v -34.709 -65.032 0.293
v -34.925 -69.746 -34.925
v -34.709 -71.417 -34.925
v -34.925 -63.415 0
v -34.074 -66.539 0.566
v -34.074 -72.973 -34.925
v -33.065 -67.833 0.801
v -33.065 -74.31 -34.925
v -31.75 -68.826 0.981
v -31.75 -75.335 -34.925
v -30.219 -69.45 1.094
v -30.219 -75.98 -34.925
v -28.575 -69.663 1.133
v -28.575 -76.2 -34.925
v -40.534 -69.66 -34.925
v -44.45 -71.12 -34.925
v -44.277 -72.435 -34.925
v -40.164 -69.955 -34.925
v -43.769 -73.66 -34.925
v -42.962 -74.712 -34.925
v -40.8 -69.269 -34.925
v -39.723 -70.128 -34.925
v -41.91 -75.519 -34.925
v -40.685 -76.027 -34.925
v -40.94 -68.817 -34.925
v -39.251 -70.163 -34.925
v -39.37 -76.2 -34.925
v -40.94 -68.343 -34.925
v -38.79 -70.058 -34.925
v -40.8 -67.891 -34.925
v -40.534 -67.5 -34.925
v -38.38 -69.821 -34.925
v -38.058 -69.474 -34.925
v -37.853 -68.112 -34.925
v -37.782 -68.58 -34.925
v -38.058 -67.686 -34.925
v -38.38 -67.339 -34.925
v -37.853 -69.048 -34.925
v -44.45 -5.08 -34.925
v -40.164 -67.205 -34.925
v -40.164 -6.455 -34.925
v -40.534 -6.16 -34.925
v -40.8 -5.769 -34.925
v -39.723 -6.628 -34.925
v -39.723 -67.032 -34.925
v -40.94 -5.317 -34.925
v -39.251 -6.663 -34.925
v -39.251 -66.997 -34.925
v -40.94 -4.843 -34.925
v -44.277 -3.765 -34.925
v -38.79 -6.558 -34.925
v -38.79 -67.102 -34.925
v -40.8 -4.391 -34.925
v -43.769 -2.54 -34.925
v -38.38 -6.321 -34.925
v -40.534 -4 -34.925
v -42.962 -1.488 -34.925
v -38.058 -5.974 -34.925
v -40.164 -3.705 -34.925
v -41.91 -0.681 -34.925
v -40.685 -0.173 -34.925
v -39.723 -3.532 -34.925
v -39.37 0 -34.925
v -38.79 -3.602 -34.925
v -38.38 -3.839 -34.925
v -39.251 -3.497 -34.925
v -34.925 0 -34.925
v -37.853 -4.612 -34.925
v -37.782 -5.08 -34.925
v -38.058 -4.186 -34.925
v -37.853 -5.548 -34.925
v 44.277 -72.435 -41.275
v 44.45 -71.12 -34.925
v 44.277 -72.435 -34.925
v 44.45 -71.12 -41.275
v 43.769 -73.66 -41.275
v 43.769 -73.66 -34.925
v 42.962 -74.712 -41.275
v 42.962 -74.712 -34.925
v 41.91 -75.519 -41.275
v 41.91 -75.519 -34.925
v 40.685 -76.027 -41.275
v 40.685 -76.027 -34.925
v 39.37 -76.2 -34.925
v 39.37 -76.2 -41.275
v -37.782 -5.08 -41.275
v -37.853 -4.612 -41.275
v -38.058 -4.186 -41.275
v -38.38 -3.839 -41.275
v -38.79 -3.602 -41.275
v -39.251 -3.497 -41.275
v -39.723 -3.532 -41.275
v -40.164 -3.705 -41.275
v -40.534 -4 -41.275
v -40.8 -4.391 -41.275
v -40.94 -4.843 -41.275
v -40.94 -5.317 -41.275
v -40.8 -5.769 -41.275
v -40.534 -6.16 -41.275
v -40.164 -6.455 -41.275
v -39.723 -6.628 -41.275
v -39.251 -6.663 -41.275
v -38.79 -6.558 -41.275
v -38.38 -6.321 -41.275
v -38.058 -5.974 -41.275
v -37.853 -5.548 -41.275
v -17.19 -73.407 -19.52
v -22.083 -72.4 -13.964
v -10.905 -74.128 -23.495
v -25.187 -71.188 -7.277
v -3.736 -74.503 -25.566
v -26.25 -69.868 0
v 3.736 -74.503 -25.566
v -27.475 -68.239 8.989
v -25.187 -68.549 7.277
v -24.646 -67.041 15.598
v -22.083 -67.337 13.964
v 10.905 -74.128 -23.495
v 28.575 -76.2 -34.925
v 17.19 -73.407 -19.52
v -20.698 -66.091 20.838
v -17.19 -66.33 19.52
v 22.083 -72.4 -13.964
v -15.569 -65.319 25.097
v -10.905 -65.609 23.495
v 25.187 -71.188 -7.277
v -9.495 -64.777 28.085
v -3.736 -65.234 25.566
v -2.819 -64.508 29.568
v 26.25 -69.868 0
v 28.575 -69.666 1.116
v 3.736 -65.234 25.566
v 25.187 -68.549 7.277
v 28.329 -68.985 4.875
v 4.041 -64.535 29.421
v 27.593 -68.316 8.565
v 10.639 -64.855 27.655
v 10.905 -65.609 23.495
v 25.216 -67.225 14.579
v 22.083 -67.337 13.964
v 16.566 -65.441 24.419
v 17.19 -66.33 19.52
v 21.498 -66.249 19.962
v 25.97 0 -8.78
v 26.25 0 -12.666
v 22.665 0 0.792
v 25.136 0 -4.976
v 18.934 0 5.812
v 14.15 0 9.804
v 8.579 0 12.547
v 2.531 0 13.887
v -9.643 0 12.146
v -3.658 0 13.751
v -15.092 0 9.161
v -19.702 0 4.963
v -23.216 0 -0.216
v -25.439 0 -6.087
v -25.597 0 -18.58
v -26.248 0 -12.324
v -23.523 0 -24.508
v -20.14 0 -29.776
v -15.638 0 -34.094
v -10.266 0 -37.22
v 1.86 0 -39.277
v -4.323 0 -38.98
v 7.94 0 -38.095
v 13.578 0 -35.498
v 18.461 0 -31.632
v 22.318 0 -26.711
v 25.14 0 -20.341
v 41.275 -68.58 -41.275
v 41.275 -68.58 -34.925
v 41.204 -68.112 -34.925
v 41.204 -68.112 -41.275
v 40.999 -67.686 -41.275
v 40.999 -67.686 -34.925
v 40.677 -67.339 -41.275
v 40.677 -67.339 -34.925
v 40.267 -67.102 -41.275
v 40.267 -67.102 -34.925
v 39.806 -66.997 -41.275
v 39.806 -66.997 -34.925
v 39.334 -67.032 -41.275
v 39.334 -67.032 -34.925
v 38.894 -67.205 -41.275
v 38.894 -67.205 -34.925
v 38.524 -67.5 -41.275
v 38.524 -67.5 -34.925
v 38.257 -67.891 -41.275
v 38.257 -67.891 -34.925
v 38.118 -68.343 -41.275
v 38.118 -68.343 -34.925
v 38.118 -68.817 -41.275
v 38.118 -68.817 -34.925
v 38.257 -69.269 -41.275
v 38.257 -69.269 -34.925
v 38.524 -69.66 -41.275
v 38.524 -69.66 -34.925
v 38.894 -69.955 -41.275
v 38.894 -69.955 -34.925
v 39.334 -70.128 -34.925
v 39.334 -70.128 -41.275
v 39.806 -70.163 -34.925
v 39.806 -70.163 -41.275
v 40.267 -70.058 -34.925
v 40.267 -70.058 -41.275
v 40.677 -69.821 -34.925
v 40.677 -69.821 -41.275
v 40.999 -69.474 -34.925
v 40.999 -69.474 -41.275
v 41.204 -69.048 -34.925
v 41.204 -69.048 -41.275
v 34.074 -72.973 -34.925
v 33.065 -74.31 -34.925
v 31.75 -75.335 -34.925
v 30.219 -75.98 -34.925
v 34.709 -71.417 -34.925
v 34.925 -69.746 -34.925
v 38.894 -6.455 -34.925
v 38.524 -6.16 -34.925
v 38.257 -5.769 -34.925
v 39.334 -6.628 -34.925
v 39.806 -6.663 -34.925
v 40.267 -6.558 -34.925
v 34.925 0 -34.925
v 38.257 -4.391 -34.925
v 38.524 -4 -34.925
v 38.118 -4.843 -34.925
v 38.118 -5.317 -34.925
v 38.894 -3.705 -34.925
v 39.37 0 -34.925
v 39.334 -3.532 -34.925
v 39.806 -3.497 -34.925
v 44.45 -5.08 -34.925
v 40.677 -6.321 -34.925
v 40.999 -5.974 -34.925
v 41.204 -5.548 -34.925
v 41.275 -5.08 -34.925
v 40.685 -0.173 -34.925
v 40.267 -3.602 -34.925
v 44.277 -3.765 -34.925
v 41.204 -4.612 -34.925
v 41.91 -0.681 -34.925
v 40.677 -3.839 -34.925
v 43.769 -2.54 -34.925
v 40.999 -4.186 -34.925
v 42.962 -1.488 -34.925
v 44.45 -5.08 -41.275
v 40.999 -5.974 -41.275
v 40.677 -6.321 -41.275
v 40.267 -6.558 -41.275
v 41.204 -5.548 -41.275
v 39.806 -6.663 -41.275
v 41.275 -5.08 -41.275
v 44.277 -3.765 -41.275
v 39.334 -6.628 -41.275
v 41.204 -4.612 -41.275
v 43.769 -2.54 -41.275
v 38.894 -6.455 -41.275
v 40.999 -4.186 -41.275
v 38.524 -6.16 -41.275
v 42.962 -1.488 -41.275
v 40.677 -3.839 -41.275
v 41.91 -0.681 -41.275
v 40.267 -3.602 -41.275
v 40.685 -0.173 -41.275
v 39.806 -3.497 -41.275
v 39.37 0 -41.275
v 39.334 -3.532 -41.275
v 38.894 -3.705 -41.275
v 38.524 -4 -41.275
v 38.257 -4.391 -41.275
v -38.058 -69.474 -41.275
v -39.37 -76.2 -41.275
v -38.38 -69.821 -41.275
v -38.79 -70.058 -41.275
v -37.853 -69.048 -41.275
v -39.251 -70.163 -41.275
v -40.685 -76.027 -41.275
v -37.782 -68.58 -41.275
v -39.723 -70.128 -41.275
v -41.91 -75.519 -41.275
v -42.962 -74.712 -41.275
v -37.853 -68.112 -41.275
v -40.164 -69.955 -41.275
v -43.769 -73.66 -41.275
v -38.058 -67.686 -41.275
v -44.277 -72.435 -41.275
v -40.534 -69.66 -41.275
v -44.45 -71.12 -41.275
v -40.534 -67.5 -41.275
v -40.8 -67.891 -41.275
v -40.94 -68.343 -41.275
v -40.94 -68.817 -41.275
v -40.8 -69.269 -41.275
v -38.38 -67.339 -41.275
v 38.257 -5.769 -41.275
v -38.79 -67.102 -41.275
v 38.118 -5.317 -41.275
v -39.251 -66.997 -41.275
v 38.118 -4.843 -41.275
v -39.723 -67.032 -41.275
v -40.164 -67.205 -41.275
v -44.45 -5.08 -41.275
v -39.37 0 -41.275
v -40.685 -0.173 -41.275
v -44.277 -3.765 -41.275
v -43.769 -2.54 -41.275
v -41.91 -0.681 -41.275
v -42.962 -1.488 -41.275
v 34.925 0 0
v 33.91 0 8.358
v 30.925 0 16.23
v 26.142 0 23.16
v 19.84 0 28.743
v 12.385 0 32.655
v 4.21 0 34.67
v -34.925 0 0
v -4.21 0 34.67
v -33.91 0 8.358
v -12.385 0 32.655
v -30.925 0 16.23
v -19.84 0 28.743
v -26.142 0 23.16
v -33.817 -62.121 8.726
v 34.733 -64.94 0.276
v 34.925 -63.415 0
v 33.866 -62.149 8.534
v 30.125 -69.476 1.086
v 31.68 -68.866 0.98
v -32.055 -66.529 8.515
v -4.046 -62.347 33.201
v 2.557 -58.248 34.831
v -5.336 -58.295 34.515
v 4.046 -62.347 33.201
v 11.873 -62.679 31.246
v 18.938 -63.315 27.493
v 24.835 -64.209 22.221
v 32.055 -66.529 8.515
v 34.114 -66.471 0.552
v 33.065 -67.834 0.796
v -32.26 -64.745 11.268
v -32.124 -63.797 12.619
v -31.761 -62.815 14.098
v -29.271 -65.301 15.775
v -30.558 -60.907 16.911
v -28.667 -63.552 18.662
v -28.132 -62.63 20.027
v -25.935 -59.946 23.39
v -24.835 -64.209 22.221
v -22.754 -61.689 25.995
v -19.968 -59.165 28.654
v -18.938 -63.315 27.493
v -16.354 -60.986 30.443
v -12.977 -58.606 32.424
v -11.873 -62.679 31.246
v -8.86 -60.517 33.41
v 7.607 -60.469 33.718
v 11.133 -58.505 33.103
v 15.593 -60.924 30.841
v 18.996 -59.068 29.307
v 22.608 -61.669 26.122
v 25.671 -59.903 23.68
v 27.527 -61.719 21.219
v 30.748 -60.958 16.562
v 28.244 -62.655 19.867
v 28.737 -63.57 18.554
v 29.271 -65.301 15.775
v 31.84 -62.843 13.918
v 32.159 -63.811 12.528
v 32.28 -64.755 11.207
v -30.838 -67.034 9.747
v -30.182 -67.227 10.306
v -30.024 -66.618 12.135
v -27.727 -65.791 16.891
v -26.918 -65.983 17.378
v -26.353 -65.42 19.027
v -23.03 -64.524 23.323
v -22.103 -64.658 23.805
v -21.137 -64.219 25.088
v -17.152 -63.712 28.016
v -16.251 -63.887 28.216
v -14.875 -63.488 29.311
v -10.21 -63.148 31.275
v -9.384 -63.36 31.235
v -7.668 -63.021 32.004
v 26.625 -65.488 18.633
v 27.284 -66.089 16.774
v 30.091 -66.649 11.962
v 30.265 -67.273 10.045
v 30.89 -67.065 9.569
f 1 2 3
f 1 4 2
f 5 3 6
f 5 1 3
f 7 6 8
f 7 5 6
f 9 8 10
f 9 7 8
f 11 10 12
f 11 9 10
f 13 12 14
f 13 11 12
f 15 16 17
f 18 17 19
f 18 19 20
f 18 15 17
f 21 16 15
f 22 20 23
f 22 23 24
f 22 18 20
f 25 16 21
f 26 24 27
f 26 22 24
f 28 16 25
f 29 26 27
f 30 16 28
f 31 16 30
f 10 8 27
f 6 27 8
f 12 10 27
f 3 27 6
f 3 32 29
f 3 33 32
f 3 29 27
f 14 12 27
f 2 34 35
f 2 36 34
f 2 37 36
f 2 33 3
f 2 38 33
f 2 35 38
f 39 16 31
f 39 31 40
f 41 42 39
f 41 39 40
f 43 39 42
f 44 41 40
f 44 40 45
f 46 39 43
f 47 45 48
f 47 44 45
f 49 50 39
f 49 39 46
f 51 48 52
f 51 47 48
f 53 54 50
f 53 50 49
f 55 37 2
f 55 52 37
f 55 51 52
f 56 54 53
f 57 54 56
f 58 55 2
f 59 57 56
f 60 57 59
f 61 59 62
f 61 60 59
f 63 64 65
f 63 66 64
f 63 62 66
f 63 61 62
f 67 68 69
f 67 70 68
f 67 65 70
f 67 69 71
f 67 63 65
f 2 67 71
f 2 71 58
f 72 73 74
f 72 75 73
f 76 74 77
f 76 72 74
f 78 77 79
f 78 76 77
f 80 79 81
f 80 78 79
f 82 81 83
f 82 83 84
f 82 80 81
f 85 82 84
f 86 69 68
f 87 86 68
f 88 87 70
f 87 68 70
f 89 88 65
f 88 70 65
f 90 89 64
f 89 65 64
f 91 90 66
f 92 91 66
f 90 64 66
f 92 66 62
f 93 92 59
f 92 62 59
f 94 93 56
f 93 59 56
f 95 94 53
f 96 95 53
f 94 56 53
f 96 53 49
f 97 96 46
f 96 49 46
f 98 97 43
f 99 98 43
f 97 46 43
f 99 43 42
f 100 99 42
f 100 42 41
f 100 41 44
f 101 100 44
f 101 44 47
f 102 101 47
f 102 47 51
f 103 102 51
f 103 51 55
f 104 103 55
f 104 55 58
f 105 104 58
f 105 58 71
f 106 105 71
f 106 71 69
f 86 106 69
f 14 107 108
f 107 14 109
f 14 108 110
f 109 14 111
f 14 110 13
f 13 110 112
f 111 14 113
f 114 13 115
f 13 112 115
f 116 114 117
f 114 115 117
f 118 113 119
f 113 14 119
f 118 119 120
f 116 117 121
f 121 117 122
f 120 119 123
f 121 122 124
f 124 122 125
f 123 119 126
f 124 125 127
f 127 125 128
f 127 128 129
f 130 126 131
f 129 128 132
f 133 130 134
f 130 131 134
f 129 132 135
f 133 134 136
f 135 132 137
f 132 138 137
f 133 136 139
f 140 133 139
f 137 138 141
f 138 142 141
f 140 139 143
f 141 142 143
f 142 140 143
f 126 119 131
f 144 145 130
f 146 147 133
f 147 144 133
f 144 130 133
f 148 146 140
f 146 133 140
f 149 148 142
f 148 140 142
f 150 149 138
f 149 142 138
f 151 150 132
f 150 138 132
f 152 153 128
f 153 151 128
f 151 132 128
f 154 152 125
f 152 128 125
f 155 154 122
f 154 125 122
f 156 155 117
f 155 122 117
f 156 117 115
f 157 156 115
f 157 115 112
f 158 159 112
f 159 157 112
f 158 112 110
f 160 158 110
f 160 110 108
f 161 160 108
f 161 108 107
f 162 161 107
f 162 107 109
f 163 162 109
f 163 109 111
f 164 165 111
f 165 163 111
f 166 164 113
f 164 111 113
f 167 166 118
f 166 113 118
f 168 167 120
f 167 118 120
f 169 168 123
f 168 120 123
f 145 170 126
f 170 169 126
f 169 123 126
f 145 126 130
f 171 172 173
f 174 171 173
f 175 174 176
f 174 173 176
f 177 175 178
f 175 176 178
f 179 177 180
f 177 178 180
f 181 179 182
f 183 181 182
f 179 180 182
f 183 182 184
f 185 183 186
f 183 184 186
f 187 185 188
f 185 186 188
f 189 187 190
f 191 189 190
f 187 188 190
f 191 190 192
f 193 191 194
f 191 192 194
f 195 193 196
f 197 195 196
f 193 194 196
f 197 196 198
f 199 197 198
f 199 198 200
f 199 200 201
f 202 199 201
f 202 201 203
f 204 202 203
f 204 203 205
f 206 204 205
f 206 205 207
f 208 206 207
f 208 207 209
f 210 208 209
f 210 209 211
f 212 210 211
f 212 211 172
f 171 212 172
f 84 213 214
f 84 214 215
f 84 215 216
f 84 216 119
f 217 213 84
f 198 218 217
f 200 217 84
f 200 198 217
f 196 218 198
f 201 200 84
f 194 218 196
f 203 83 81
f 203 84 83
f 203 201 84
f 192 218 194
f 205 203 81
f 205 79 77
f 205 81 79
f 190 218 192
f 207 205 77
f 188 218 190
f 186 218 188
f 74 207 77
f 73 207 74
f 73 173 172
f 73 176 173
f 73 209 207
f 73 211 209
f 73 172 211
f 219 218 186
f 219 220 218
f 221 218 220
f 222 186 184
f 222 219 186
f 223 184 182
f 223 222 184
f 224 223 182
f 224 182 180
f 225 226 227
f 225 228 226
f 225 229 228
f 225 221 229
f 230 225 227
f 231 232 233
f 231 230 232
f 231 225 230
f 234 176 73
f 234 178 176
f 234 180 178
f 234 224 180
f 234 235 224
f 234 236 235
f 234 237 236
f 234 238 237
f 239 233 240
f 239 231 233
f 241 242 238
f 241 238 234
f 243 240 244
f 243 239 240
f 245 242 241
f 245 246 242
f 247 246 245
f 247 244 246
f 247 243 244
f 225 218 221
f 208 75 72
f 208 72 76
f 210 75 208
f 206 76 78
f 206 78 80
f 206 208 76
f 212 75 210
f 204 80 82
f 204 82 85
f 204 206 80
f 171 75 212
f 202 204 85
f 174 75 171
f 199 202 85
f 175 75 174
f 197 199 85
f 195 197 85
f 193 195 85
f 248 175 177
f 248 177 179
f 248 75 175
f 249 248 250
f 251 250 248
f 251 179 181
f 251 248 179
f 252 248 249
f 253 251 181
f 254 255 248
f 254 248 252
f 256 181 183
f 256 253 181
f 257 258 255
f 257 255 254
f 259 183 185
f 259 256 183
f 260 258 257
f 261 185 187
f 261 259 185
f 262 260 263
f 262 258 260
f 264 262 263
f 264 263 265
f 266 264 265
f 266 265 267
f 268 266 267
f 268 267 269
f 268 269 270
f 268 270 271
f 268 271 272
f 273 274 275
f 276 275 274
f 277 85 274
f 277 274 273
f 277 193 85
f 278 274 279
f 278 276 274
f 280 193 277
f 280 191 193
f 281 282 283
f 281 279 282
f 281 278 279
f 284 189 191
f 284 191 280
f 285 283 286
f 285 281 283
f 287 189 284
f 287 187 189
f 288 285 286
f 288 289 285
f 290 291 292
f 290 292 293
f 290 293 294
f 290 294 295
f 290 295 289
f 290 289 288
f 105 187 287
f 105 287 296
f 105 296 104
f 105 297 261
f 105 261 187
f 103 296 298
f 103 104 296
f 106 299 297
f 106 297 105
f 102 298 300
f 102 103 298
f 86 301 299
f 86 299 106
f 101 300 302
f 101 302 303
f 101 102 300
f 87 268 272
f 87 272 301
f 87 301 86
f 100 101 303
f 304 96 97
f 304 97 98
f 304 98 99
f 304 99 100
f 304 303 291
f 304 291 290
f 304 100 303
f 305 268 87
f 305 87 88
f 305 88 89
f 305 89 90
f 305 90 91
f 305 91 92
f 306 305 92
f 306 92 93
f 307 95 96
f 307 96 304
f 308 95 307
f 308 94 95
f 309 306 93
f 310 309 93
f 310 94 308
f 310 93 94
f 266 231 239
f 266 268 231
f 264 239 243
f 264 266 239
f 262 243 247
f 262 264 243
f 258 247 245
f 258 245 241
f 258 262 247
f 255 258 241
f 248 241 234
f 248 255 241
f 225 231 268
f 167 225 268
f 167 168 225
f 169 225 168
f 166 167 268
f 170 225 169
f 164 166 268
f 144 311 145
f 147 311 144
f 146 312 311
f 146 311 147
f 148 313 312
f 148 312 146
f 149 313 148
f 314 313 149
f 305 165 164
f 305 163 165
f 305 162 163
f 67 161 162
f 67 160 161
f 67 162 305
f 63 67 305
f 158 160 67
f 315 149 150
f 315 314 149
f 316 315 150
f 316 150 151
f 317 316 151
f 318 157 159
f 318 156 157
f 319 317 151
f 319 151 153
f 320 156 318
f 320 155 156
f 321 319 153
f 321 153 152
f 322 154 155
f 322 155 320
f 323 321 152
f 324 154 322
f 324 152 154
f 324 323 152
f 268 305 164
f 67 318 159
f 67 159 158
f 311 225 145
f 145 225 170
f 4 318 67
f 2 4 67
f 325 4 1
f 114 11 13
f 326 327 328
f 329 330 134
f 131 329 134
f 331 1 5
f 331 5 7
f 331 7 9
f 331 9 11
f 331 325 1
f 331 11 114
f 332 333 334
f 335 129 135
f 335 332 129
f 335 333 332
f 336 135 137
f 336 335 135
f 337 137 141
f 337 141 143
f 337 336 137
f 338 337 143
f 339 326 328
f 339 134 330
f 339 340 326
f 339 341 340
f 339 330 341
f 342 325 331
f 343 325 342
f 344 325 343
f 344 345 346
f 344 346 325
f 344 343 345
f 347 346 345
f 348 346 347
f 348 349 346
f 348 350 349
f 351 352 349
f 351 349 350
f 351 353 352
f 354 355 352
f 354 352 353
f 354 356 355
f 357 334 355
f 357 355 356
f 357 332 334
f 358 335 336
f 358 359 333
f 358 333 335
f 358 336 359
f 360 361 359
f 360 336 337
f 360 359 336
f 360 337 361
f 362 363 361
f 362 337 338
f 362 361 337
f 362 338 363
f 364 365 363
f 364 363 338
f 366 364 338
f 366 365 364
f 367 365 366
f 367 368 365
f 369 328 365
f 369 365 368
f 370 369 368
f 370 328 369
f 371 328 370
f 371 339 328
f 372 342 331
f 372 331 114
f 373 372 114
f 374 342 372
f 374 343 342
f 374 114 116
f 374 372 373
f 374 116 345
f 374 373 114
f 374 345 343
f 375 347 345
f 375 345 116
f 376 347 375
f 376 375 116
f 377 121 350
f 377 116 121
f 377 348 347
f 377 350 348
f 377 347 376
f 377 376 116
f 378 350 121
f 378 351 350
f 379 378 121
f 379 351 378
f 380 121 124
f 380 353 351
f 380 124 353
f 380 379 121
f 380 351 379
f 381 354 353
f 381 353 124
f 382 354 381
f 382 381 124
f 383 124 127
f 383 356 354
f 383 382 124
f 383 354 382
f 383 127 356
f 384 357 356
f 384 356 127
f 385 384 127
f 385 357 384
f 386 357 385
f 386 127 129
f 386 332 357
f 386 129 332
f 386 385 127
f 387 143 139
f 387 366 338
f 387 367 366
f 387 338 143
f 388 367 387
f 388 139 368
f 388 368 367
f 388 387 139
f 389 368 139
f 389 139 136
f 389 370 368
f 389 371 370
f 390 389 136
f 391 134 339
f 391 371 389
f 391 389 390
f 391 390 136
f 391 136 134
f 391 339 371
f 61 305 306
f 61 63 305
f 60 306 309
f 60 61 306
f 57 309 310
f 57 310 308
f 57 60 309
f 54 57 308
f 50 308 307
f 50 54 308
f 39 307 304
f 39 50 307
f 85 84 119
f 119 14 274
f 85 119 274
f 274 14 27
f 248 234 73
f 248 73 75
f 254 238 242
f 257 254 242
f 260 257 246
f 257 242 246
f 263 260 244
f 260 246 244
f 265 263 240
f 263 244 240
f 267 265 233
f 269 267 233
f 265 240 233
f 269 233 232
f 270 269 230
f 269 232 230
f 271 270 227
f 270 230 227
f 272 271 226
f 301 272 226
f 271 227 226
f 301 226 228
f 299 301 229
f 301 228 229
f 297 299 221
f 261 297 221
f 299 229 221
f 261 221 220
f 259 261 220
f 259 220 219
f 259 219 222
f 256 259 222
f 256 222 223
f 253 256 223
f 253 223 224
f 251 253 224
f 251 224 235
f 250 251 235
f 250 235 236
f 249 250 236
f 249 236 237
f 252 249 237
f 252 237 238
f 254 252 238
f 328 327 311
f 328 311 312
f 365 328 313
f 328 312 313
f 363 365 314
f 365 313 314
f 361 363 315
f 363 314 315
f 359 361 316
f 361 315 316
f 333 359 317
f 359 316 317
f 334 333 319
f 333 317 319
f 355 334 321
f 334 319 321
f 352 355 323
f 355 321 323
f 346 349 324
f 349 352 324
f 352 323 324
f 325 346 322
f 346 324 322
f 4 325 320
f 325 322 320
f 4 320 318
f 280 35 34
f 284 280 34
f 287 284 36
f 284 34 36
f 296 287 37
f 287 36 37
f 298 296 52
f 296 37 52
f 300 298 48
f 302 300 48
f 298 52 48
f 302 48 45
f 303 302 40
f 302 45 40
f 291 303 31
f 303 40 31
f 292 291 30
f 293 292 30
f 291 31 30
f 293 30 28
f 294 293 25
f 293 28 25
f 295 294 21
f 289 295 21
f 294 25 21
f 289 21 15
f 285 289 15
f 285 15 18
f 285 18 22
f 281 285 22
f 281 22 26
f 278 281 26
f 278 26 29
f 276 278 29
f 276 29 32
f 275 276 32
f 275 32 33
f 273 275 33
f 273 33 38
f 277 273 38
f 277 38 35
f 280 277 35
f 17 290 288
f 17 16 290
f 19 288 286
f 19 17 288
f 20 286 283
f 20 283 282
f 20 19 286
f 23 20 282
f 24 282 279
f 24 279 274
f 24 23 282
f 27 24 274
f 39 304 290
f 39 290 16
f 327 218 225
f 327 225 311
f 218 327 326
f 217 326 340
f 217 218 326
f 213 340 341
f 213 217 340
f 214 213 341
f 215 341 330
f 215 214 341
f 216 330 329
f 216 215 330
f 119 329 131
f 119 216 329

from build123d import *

# Parameters (mm, degrees)
F1_DEPTH  = 76.2
F3_DEPTH  = 69.851
F6_DEPTH  = 76.2
F4_R      = 26.25
F7_DEPTH  = 76.1115745433
F8_R      = 6.35
F9_R      = 5.08
F10_R     = 1.5875
F11_DEPTH = 25.4


with BuildPart() as f1:
    # F0 (on Front) → F1 (new body)
    with BuildSketch(Plane.XZ):
        with BuildLine():
            Line((-34.925, -34.925), (34.925, -34.925))
            Line((34.925, -34.925), (34.925, 0))
            ThreePointArc((34.925, 0), (0, 34.925), (-34.925, 0))
            Line((-34.925, 0), (-34.925, -34.925))
        make_face()
    extrude(amount=F1_DEPTH)

    # F2 (on face) → F3 (cut, through all)
    with BuildSketch(Plane.YZ.offset(34.925)):
        Polygon((-76.2, 35.1284742355), (-76.2, -34.925), (-63.5, 35.1284742355), align=None)
    extrude(amount=-F3_DEPTH, mode=Mode.SUBTRACT)

    # F5 (on face) → F6 (join)
    with BuildSketch(Plane(origin=(0, 0, 0), x_dir=(-1, 0, 0), z_dir=(0, 1, 0))):
        Polygon((-34.925, -34.925), (-44.45, -34.925), (-44.45, -41.275), (44.45, -41.275), (44.45, -34.925), (34.925, -34.925), align=None)
    extrude(amount=-F6_DEPTH)

    # F4 (on face) → F7 (cut, through all)
    with BuildSketch(Plane(origin=(0, -67.6452101377, 12.2634056073), x_dir=(1, 0, 0), z_dir=(0, -0.9839612366, 0.178382412))):
        with Locations((0, -12.4633015524)):
            Circle(F4_R)
    extrude(amount=-F7_DEPTH, mode=Mode.SUBTRACT)

    # F8
    f8_edges = [f1.edges().sort_by_distance(p)[0] for p in [
        (0, -63.536888, 34.925),
    ]]
    fillet(f8_edges, radius=F8_R)

    # F9
    f9_edges = [f1.edges().sort_by_distance(p)[0] for p in [
        (-44.45, -76.2, -38.1),
        (-44.45, 0, -38.1),
        (44.45, -76.2, -38.1),
        (44.45, 0, -38.1),
    ]]
    fillet(f9_edges, radius=F9_R)

    # F10 (on face) → F11 (cut)
    with BuildSketch(Plane.XY.offset(-34.925)):
        with Locations((-39.37, -5.08)):
            Circle(F10_R)
        with Locations((-39.37, -68.58)):
            Circle(F10_R)
        with Locations((39.6875, -68.58)):
            Circle(F10_R)
        with Locations((39.6875, -5.08)):
            Circle(F10_R)
    extrude(amount=-F11_DEPTH, mode=Mode.SUBTRACT)


solid = f1.part
